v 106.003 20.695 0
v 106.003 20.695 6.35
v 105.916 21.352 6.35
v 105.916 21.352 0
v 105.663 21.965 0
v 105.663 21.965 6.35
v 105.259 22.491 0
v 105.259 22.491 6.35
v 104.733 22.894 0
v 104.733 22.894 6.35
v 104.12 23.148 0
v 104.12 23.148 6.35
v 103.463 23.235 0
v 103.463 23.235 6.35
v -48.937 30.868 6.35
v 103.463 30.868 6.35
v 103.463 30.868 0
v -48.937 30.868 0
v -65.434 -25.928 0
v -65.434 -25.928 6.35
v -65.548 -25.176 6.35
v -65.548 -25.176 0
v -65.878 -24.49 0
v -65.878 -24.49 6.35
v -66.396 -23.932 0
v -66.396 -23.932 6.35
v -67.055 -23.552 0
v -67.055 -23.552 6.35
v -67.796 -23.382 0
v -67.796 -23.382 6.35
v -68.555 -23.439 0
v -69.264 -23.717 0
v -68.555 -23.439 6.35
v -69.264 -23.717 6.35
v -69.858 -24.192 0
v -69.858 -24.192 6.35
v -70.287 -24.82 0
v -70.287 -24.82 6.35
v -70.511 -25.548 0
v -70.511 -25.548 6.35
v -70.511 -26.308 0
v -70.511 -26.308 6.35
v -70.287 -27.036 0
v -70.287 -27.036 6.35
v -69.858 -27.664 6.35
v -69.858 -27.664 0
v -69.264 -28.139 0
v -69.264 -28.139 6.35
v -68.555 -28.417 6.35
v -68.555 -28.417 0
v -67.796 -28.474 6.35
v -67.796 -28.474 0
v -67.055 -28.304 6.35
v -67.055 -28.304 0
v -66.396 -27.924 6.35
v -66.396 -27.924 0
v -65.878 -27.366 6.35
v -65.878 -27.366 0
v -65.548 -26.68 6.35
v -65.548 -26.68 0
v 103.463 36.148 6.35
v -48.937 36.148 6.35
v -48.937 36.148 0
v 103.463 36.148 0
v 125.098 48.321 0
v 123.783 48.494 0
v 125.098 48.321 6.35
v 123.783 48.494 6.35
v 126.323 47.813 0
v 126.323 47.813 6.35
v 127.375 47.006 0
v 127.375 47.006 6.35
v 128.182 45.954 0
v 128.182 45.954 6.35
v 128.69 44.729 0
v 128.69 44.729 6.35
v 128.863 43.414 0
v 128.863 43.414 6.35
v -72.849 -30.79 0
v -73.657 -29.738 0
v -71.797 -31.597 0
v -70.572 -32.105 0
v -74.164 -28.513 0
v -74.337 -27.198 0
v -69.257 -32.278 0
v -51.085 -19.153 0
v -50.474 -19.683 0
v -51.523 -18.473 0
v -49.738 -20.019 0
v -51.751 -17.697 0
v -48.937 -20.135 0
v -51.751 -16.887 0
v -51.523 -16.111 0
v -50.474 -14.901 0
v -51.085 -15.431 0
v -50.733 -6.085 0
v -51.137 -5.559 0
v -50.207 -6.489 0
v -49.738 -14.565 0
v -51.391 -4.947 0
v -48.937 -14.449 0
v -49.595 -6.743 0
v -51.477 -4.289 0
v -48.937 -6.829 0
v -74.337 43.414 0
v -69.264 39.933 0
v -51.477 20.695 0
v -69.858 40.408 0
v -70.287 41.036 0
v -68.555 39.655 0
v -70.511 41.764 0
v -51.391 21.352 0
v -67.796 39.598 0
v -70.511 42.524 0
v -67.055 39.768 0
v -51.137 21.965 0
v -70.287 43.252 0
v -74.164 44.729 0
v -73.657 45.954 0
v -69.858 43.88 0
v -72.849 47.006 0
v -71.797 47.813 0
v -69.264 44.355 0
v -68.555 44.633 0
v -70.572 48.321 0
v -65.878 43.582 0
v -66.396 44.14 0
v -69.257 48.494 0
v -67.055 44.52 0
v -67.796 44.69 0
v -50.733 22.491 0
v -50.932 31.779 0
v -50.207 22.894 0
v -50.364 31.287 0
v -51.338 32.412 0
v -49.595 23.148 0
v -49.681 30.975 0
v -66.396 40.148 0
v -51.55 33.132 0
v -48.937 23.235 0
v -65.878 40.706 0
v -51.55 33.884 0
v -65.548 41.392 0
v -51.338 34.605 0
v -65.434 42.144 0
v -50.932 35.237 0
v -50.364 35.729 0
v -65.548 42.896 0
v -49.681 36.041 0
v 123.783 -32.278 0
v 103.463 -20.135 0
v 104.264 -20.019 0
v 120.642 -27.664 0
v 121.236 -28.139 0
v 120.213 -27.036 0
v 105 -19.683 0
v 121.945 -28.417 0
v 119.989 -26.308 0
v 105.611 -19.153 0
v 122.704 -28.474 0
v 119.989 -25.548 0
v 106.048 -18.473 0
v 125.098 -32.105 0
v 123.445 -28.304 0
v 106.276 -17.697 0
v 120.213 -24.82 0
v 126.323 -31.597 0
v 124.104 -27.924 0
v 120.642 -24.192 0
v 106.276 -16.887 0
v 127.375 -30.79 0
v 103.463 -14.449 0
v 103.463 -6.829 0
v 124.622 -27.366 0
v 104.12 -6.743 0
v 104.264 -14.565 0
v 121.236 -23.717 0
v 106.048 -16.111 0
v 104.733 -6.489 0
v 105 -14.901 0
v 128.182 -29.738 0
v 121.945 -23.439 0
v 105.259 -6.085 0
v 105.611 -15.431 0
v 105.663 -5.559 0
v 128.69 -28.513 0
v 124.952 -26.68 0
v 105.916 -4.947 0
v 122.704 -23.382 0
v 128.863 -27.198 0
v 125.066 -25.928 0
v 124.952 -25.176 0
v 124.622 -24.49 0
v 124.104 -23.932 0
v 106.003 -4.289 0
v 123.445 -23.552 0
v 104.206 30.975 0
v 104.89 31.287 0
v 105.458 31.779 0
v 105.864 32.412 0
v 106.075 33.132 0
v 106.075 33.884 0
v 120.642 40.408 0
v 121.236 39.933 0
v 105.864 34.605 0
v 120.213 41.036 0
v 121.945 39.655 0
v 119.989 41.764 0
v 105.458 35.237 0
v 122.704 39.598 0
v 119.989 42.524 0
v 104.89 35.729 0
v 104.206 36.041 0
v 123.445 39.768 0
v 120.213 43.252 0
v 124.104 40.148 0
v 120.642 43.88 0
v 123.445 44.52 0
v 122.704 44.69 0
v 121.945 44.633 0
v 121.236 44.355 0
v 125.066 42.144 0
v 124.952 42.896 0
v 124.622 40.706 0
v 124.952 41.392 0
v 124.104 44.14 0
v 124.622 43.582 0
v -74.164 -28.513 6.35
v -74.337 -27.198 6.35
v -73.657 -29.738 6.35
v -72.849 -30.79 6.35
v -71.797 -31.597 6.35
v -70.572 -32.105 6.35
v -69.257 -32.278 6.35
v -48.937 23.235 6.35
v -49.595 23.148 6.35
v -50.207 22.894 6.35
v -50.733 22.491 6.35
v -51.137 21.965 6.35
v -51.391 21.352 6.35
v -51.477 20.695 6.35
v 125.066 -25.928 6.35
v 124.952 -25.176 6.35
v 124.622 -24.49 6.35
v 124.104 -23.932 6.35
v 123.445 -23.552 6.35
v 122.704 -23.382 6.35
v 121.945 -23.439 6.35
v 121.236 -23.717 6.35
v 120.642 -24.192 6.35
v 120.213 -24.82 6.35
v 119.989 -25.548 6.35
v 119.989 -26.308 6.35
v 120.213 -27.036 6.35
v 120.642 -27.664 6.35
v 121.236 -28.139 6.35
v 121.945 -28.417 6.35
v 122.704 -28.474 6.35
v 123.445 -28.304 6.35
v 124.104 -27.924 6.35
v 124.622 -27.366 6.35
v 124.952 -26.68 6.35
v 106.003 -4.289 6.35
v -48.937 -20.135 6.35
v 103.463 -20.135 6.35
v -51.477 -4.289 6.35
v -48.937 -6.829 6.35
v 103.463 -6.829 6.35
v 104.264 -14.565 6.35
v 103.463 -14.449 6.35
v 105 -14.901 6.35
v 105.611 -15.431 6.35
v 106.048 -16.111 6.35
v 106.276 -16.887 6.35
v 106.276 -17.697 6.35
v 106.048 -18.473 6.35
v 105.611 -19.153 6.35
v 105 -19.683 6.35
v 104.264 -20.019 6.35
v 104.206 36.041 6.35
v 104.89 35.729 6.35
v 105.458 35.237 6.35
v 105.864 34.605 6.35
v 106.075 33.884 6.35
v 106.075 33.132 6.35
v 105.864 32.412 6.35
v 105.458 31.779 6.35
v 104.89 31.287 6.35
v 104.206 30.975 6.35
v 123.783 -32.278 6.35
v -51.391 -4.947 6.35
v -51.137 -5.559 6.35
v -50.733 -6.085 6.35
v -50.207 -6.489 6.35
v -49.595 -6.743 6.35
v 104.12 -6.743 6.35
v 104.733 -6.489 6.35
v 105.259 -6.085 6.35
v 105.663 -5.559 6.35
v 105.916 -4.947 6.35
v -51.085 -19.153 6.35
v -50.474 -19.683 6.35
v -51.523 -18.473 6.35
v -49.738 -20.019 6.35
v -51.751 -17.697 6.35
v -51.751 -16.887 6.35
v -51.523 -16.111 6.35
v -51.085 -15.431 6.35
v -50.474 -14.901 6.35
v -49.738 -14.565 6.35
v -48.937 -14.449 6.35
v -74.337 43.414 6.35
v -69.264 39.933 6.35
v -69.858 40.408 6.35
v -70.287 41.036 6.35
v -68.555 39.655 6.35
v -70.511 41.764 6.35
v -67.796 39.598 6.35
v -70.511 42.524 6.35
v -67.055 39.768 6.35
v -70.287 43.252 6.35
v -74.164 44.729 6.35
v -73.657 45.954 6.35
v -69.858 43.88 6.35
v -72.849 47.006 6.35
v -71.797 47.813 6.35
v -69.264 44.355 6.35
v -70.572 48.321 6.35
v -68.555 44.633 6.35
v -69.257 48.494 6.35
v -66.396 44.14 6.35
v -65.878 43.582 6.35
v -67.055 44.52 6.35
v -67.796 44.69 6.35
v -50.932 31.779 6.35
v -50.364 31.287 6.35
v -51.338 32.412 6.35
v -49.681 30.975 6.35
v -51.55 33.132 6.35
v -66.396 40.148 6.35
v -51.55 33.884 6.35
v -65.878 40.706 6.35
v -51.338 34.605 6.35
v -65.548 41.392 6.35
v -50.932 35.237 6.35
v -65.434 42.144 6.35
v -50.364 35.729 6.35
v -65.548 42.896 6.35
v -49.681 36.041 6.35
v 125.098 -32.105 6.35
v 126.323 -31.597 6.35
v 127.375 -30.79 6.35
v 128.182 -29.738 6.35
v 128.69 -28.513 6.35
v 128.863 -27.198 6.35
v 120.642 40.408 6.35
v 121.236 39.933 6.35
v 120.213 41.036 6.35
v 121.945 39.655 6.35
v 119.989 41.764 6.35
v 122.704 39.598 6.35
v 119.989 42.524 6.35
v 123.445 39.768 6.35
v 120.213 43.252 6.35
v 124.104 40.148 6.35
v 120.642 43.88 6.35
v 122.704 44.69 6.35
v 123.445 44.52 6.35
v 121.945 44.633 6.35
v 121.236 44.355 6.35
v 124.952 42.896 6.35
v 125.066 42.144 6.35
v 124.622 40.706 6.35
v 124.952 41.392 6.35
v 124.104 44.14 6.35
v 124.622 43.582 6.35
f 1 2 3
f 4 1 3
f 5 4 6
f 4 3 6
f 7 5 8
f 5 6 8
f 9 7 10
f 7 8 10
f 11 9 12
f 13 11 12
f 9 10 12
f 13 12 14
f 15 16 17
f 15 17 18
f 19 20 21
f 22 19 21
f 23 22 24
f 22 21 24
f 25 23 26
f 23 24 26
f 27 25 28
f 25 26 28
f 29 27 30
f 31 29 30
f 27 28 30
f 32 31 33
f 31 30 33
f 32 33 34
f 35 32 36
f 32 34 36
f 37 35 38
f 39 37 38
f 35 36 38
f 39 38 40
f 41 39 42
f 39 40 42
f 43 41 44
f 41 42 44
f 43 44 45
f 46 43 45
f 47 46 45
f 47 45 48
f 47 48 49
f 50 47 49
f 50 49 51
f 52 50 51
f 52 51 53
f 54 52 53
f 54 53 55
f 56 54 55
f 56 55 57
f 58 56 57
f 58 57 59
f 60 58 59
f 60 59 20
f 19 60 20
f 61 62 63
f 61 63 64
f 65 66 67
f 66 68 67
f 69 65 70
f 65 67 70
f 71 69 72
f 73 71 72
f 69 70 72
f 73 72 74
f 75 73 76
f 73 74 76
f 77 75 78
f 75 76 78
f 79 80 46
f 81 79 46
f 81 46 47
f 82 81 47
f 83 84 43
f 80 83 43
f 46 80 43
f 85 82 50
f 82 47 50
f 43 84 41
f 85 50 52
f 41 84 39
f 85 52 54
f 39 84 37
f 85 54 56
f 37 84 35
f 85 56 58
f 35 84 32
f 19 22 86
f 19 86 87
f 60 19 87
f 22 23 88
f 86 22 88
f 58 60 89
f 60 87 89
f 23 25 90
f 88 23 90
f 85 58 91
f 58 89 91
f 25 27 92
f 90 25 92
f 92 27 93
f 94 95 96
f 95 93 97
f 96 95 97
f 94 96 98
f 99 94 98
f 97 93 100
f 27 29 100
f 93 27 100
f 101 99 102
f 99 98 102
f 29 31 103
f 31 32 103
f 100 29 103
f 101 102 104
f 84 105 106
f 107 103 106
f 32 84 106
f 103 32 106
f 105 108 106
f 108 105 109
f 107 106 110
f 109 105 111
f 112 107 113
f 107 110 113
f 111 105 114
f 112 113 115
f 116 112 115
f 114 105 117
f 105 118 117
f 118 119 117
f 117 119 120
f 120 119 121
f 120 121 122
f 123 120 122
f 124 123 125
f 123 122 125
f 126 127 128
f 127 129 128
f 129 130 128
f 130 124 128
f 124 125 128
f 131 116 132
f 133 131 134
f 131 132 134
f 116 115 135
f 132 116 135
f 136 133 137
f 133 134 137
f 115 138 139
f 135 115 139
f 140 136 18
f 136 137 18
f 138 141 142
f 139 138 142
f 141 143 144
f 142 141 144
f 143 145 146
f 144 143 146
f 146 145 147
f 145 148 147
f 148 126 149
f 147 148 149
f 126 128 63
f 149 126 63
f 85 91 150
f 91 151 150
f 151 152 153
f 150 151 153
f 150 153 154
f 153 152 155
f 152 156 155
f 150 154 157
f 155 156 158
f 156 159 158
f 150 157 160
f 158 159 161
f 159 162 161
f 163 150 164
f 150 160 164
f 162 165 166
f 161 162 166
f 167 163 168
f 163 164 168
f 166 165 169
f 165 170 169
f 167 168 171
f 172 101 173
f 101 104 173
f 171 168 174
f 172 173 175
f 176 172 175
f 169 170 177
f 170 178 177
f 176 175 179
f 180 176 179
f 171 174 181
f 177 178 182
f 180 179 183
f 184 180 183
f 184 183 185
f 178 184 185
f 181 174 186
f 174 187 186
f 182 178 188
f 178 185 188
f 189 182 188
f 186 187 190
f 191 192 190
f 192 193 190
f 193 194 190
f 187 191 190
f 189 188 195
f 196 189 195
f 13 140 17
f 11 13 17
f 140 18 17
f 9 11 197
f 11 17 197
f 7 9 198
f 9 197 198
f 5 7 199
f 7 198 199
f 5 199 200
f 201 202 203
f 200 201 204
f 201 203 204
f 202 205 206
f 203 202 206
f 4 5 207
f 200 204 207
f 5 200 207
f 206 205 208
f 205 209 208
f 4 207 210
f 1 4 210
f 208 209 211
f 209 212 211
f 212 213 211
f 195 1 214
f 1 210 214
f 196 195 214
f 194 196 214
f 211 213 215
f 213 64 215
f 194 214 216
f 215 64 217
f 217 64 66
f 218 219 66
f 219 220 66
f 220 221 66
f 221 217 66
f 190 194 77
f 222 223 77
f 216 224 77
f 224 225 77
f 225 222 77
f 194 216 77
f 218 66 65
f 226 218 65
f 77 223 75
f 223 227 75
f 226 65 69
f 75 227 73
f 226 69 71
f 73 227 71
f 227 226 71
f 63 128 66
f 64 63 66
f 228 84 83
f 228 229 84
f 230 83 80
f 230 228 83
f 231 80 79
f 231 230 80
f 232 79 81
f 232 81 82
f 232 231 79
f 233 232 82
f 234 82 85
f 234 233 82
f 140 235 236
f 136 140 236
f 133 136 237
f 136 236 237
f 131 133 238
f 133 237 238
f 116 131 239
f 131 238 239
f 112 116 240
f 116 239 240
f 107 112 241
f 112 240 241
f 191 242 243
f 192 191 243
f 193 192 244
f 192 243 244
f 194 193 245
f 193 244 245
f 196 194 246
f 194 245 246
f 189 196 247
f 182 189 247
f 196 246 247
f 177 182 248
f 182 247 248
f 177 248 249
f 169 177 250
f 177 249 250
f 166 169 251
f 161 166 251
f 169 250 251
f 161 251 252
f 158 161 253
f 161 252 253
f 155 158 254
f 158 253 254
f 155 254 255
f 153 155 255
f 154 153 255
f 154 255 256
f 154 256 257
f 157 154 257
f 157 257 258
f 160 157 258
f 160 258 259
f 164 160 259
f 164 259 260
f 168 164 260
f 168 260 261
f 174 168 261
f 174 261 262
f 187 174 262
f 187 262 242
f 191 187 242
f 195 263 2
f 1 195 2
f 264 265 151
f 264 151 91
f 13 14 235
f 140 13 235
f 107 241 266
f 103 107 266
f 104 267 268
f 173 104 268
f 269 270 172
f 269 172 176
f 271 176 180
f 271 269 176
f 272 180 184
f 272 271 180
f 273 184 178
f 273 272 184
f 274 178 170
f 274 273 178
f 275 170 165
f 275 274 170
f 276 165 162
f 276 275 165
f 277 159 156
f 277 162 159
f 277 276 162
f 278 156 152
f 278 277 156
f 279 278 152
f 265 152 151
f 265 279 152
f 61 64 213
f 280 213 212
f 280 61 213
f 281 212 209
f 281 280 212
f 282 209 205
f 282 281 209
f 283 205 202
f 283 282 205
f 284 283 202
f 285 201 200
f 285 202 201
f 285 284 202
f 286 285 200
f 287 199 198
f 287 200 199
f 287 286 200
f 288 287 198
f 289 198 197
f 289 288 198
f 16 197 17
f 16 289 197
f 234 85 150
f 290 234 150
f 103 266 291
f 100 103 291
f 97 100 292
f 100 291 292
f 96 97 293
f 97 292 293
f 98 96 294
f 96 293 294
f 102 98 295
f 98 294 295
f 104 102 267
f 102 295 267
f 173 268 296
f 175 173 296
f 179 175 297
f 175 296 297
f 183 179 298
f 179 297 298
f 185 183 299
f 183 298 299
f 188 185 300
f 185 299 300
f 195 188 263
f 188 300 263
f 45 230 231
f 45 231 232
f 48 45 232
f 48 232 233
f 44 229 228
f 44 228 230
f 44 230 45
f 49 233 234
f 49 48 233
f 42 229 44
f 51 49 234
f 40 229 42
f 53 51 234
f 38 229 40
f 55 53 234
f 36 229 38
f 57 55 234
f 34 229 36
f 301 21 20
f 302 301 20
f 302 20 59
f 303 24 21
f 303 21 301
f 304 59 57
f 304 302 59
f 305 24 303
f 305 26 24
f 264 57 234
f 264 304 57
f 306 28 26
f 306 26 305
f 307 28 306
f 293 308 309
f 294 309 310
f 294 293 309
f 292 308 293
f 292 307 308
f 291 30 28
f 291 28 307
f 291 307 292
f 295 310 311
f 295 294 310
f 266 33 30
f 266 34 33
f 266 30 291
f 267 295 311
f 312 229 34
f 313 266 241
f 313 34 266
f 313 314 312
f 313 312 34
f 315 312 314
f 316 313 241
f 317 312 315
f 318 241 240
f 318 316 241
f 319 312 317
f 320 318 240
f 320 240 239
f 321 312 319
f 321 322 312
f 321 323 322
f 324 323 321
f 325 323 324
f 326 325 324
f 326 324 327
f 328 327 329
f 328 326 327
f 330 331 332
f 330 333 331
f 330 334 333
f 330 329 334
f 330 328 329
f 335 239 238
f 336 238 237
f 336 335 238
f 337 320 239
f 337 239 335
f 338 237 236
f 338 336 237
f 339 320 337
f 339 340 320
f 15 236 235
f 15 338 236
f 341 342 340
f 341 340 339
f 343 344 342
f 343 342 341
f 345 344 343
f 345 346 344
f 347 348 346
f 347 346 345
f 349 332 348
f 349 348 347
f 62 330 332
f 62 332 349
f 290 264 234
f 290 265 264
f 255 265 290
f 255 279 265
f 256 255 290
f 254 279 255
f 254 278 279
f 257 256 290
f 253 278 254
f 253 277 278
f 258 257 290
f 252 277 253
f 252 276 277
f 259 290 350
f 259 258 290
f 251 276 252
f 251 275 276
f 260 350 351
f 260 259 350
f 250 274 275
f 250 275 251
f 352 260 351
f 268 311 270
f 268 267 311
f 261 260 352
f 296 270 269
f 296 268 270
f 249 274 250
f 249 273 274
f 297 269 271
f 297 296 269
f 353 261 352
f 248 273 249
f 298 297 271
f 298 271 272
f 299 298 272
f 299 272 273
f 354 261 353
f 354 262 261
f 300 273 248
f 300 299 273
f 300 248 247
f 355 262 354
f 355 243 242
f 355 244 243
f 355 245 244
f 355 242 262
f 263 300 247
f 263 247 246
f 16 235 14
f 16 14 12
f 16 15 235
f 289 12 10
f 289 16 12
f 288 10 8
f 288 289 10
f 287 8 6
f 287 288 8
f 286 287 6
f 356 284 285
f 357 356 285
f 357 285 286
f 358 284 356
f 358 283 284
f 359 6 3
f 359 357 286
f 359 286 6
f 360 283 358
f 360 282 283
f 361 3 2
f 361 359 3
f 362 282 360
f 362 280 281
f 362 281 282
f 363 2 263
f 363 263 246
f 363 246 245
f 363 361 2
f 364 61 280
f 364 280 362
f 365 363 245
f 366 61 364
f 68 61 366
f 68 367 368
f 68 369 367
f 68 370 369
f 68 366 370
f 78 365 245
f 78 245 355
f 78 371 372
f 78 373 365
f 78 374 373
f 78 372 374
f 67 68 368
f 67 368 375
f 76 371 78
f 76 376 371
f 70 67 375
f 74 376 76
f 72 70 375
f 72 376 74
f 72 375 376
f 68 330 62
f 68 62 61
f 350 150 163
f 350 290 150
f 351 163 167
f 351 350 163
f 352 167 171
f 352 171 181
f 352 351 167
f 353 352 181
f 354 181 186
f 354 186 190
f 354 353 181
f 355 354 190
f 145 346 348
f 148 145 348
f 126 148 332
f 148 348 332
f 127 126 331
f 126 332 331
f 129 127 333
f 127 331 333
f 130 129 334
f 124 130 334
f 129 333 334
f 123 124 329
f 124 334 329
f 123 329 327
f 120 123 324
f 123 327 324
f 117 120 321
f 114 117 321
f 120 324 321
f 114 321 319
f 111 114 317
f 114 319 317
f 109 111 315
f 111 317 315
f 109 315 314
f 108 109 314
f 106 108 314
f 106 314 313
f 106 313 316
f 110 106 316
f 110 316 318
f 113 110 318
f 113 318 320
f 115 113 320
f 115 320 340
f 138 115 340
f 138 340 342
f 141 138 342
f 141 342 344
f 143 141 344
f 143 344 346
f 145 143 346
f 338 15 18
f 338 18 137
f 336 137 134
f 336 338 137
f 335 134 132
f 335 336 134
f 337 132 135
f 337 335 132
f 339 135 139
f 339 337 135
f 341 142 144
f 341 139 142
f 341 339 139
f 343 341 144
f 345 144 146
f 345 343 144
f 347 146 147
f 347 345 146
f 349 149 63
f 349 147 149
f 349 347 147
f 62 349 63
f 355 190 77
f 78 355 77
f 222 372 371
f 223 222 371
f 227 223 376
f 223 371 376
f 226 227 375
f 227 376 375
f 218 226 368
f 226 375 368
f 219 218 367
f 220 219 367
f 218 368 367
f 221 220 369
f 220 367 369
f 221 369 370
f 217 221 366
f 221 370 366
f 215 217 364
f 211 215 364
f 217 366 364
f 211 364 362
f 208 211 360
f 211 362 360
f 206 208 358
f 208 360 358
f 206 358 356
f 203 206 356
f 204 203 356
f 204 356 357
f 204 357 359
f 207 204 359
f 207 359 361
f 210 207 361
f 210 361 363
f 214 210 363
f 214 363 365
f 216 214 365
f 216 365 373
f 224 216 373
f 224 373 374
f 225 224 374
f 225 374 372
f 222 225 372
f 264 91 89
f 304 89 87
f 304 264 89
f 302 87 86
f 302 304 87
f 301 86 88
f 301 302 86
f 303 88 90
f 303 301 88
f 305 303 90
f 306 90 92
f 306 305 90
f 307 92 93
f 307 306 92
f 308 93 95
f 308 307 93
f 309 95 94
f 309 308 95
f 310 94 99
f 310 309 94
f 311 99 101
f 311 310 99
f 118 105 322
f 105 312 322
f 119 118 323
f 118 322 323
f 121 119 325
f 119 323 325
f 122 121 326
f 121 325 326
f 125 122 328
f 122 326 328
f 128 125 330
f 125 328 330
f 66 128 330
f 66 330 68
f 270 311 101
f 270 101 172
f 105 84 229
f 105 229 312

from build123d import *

# Parameters (mm, degrees)
SKETCH1_W           = 203.2
SKETCH1_H           = 80.772
BOSS_EXTRUDE1_DEPTH = 6.35
SKETCH2_R           = 2.5527
CUT_EXTRUDE1_DEPTH  = 8.89
CUT_EXTRUDE2_DEPTH  = 13.97
FILLET1_R           = 5.08


with BuildPart() as part:
    # Sketch1 → Boss-Extrude1 (new body)
    with BuildSketch(Plane.XY):
        with Locations((27.262808983, 8.108009164)):
            Rectangle(SKETCH1_W, SKETCH1_H)
    extrude(amount=BOSS_EXTRUDE1_DEPTH)

    # Sketch2 → Cut-Extrude1 (cut)
    with BuildSketch(Plane.XY.offset(6.35)):
        with Locations((-67.987191017, 42.144009164)):
            Circle(SKETCH2_R)
        with Locations((-67.987191017, -25.927990836)):
            Circle(SKETCH2_R)
        with Locations((122.512808983, 42.144009164)):
            Circle(SKETCH2_R)
        with Locations((122.512808983, -25.927990836)):
            Circle(SKETCH2_R)
    extrude(amount=-CUT_EXTRUDE1_DEPTH, mode=Mode.SUBTRACT)

    # Sketch3 → Cut-Extrude2 (cut)
    with BuildSketch(Plane.XY.offset(6.35)):
        with BuildLine():
            Line((-48.937191017, 36.147533789), (103.462808983, 36.147533789))
            ThreePointArc((103.462808983, 36.147533789), (106.102333608, 33.508009164), (103.462808983, 30.868484538))
            Line((103.462808983, 30.868484538), (-48.937191017, 30.868484538))
            ThreePointArc((-48.937191017, 30.868484538), (-51.576715642, 33.508009164), (-48.937191017, 36.147533789))
        make_face()
        with BuildLine():
            Line((-48.937191017, -14.449425855), (103.462808983, -14.449425855))
            ThreePointArc((103.462808983, -14.449425855), (106.305373964, -17.291990836), (103.462808983, -20.134555817))
            Line((103.462808983, -20.134555817), (-48.937191017, -20.134555817))
            ThreePointArc((-48.937191017, -20.134555817), (-51.779755998, -17.291990836), (-48.937191017, -14.449425855))
        make_face()
        with BuildLine():
            Line((-48.937191017, -6.829425855), (103.462808983, -6.829425855))
            ThreePointArc((103.462808983, -6.829425855), (105.258860207, -6.08547708), (106.002808983, -4.289425855))
            Line((106.002808983, -4.289425855), (106.002808983, 20.69451567))
            ThreePointArc((106.002808983, 20.69451567), (105.258860207, 22.490566894), (103.462808983, 23.23451567))
            Line((103.462808983, 23.23451567), (-48.937191017, 23.23451567))
            ThreePointArc((-48.937191017, 23.23451567), (-50.733242241, 22.490566894), (-51.477191017, 20.69451567))
            Line((-51.477191017, 20.69451567), (-51.477191017, -4.289425855))
            ThreePointArc((-51.477191017, -4.289425855), (-50.733242241, -6.08547708), (-48.937191017, -6.829425855))
        make_face()
    extrude(amount=-CUT_EXTRUDE2_DEPTH, mode=Mode.SUBTRACT)

    # Fillet1
    fillet1_edges = [part.edges().sort_by_distance(p)[0] for p in [
        (-74.337191017, 48.494009164, 3.175),
        (128.862808983, 48.494009164, 3.175),
        (128.862808983, -32.277990836, 3.175),
        (-74.337191017, -32.277990836, 3.175),
    ]]
    fillet(fillet1_edges, radius=FILLET1_R)


solid = part.part
